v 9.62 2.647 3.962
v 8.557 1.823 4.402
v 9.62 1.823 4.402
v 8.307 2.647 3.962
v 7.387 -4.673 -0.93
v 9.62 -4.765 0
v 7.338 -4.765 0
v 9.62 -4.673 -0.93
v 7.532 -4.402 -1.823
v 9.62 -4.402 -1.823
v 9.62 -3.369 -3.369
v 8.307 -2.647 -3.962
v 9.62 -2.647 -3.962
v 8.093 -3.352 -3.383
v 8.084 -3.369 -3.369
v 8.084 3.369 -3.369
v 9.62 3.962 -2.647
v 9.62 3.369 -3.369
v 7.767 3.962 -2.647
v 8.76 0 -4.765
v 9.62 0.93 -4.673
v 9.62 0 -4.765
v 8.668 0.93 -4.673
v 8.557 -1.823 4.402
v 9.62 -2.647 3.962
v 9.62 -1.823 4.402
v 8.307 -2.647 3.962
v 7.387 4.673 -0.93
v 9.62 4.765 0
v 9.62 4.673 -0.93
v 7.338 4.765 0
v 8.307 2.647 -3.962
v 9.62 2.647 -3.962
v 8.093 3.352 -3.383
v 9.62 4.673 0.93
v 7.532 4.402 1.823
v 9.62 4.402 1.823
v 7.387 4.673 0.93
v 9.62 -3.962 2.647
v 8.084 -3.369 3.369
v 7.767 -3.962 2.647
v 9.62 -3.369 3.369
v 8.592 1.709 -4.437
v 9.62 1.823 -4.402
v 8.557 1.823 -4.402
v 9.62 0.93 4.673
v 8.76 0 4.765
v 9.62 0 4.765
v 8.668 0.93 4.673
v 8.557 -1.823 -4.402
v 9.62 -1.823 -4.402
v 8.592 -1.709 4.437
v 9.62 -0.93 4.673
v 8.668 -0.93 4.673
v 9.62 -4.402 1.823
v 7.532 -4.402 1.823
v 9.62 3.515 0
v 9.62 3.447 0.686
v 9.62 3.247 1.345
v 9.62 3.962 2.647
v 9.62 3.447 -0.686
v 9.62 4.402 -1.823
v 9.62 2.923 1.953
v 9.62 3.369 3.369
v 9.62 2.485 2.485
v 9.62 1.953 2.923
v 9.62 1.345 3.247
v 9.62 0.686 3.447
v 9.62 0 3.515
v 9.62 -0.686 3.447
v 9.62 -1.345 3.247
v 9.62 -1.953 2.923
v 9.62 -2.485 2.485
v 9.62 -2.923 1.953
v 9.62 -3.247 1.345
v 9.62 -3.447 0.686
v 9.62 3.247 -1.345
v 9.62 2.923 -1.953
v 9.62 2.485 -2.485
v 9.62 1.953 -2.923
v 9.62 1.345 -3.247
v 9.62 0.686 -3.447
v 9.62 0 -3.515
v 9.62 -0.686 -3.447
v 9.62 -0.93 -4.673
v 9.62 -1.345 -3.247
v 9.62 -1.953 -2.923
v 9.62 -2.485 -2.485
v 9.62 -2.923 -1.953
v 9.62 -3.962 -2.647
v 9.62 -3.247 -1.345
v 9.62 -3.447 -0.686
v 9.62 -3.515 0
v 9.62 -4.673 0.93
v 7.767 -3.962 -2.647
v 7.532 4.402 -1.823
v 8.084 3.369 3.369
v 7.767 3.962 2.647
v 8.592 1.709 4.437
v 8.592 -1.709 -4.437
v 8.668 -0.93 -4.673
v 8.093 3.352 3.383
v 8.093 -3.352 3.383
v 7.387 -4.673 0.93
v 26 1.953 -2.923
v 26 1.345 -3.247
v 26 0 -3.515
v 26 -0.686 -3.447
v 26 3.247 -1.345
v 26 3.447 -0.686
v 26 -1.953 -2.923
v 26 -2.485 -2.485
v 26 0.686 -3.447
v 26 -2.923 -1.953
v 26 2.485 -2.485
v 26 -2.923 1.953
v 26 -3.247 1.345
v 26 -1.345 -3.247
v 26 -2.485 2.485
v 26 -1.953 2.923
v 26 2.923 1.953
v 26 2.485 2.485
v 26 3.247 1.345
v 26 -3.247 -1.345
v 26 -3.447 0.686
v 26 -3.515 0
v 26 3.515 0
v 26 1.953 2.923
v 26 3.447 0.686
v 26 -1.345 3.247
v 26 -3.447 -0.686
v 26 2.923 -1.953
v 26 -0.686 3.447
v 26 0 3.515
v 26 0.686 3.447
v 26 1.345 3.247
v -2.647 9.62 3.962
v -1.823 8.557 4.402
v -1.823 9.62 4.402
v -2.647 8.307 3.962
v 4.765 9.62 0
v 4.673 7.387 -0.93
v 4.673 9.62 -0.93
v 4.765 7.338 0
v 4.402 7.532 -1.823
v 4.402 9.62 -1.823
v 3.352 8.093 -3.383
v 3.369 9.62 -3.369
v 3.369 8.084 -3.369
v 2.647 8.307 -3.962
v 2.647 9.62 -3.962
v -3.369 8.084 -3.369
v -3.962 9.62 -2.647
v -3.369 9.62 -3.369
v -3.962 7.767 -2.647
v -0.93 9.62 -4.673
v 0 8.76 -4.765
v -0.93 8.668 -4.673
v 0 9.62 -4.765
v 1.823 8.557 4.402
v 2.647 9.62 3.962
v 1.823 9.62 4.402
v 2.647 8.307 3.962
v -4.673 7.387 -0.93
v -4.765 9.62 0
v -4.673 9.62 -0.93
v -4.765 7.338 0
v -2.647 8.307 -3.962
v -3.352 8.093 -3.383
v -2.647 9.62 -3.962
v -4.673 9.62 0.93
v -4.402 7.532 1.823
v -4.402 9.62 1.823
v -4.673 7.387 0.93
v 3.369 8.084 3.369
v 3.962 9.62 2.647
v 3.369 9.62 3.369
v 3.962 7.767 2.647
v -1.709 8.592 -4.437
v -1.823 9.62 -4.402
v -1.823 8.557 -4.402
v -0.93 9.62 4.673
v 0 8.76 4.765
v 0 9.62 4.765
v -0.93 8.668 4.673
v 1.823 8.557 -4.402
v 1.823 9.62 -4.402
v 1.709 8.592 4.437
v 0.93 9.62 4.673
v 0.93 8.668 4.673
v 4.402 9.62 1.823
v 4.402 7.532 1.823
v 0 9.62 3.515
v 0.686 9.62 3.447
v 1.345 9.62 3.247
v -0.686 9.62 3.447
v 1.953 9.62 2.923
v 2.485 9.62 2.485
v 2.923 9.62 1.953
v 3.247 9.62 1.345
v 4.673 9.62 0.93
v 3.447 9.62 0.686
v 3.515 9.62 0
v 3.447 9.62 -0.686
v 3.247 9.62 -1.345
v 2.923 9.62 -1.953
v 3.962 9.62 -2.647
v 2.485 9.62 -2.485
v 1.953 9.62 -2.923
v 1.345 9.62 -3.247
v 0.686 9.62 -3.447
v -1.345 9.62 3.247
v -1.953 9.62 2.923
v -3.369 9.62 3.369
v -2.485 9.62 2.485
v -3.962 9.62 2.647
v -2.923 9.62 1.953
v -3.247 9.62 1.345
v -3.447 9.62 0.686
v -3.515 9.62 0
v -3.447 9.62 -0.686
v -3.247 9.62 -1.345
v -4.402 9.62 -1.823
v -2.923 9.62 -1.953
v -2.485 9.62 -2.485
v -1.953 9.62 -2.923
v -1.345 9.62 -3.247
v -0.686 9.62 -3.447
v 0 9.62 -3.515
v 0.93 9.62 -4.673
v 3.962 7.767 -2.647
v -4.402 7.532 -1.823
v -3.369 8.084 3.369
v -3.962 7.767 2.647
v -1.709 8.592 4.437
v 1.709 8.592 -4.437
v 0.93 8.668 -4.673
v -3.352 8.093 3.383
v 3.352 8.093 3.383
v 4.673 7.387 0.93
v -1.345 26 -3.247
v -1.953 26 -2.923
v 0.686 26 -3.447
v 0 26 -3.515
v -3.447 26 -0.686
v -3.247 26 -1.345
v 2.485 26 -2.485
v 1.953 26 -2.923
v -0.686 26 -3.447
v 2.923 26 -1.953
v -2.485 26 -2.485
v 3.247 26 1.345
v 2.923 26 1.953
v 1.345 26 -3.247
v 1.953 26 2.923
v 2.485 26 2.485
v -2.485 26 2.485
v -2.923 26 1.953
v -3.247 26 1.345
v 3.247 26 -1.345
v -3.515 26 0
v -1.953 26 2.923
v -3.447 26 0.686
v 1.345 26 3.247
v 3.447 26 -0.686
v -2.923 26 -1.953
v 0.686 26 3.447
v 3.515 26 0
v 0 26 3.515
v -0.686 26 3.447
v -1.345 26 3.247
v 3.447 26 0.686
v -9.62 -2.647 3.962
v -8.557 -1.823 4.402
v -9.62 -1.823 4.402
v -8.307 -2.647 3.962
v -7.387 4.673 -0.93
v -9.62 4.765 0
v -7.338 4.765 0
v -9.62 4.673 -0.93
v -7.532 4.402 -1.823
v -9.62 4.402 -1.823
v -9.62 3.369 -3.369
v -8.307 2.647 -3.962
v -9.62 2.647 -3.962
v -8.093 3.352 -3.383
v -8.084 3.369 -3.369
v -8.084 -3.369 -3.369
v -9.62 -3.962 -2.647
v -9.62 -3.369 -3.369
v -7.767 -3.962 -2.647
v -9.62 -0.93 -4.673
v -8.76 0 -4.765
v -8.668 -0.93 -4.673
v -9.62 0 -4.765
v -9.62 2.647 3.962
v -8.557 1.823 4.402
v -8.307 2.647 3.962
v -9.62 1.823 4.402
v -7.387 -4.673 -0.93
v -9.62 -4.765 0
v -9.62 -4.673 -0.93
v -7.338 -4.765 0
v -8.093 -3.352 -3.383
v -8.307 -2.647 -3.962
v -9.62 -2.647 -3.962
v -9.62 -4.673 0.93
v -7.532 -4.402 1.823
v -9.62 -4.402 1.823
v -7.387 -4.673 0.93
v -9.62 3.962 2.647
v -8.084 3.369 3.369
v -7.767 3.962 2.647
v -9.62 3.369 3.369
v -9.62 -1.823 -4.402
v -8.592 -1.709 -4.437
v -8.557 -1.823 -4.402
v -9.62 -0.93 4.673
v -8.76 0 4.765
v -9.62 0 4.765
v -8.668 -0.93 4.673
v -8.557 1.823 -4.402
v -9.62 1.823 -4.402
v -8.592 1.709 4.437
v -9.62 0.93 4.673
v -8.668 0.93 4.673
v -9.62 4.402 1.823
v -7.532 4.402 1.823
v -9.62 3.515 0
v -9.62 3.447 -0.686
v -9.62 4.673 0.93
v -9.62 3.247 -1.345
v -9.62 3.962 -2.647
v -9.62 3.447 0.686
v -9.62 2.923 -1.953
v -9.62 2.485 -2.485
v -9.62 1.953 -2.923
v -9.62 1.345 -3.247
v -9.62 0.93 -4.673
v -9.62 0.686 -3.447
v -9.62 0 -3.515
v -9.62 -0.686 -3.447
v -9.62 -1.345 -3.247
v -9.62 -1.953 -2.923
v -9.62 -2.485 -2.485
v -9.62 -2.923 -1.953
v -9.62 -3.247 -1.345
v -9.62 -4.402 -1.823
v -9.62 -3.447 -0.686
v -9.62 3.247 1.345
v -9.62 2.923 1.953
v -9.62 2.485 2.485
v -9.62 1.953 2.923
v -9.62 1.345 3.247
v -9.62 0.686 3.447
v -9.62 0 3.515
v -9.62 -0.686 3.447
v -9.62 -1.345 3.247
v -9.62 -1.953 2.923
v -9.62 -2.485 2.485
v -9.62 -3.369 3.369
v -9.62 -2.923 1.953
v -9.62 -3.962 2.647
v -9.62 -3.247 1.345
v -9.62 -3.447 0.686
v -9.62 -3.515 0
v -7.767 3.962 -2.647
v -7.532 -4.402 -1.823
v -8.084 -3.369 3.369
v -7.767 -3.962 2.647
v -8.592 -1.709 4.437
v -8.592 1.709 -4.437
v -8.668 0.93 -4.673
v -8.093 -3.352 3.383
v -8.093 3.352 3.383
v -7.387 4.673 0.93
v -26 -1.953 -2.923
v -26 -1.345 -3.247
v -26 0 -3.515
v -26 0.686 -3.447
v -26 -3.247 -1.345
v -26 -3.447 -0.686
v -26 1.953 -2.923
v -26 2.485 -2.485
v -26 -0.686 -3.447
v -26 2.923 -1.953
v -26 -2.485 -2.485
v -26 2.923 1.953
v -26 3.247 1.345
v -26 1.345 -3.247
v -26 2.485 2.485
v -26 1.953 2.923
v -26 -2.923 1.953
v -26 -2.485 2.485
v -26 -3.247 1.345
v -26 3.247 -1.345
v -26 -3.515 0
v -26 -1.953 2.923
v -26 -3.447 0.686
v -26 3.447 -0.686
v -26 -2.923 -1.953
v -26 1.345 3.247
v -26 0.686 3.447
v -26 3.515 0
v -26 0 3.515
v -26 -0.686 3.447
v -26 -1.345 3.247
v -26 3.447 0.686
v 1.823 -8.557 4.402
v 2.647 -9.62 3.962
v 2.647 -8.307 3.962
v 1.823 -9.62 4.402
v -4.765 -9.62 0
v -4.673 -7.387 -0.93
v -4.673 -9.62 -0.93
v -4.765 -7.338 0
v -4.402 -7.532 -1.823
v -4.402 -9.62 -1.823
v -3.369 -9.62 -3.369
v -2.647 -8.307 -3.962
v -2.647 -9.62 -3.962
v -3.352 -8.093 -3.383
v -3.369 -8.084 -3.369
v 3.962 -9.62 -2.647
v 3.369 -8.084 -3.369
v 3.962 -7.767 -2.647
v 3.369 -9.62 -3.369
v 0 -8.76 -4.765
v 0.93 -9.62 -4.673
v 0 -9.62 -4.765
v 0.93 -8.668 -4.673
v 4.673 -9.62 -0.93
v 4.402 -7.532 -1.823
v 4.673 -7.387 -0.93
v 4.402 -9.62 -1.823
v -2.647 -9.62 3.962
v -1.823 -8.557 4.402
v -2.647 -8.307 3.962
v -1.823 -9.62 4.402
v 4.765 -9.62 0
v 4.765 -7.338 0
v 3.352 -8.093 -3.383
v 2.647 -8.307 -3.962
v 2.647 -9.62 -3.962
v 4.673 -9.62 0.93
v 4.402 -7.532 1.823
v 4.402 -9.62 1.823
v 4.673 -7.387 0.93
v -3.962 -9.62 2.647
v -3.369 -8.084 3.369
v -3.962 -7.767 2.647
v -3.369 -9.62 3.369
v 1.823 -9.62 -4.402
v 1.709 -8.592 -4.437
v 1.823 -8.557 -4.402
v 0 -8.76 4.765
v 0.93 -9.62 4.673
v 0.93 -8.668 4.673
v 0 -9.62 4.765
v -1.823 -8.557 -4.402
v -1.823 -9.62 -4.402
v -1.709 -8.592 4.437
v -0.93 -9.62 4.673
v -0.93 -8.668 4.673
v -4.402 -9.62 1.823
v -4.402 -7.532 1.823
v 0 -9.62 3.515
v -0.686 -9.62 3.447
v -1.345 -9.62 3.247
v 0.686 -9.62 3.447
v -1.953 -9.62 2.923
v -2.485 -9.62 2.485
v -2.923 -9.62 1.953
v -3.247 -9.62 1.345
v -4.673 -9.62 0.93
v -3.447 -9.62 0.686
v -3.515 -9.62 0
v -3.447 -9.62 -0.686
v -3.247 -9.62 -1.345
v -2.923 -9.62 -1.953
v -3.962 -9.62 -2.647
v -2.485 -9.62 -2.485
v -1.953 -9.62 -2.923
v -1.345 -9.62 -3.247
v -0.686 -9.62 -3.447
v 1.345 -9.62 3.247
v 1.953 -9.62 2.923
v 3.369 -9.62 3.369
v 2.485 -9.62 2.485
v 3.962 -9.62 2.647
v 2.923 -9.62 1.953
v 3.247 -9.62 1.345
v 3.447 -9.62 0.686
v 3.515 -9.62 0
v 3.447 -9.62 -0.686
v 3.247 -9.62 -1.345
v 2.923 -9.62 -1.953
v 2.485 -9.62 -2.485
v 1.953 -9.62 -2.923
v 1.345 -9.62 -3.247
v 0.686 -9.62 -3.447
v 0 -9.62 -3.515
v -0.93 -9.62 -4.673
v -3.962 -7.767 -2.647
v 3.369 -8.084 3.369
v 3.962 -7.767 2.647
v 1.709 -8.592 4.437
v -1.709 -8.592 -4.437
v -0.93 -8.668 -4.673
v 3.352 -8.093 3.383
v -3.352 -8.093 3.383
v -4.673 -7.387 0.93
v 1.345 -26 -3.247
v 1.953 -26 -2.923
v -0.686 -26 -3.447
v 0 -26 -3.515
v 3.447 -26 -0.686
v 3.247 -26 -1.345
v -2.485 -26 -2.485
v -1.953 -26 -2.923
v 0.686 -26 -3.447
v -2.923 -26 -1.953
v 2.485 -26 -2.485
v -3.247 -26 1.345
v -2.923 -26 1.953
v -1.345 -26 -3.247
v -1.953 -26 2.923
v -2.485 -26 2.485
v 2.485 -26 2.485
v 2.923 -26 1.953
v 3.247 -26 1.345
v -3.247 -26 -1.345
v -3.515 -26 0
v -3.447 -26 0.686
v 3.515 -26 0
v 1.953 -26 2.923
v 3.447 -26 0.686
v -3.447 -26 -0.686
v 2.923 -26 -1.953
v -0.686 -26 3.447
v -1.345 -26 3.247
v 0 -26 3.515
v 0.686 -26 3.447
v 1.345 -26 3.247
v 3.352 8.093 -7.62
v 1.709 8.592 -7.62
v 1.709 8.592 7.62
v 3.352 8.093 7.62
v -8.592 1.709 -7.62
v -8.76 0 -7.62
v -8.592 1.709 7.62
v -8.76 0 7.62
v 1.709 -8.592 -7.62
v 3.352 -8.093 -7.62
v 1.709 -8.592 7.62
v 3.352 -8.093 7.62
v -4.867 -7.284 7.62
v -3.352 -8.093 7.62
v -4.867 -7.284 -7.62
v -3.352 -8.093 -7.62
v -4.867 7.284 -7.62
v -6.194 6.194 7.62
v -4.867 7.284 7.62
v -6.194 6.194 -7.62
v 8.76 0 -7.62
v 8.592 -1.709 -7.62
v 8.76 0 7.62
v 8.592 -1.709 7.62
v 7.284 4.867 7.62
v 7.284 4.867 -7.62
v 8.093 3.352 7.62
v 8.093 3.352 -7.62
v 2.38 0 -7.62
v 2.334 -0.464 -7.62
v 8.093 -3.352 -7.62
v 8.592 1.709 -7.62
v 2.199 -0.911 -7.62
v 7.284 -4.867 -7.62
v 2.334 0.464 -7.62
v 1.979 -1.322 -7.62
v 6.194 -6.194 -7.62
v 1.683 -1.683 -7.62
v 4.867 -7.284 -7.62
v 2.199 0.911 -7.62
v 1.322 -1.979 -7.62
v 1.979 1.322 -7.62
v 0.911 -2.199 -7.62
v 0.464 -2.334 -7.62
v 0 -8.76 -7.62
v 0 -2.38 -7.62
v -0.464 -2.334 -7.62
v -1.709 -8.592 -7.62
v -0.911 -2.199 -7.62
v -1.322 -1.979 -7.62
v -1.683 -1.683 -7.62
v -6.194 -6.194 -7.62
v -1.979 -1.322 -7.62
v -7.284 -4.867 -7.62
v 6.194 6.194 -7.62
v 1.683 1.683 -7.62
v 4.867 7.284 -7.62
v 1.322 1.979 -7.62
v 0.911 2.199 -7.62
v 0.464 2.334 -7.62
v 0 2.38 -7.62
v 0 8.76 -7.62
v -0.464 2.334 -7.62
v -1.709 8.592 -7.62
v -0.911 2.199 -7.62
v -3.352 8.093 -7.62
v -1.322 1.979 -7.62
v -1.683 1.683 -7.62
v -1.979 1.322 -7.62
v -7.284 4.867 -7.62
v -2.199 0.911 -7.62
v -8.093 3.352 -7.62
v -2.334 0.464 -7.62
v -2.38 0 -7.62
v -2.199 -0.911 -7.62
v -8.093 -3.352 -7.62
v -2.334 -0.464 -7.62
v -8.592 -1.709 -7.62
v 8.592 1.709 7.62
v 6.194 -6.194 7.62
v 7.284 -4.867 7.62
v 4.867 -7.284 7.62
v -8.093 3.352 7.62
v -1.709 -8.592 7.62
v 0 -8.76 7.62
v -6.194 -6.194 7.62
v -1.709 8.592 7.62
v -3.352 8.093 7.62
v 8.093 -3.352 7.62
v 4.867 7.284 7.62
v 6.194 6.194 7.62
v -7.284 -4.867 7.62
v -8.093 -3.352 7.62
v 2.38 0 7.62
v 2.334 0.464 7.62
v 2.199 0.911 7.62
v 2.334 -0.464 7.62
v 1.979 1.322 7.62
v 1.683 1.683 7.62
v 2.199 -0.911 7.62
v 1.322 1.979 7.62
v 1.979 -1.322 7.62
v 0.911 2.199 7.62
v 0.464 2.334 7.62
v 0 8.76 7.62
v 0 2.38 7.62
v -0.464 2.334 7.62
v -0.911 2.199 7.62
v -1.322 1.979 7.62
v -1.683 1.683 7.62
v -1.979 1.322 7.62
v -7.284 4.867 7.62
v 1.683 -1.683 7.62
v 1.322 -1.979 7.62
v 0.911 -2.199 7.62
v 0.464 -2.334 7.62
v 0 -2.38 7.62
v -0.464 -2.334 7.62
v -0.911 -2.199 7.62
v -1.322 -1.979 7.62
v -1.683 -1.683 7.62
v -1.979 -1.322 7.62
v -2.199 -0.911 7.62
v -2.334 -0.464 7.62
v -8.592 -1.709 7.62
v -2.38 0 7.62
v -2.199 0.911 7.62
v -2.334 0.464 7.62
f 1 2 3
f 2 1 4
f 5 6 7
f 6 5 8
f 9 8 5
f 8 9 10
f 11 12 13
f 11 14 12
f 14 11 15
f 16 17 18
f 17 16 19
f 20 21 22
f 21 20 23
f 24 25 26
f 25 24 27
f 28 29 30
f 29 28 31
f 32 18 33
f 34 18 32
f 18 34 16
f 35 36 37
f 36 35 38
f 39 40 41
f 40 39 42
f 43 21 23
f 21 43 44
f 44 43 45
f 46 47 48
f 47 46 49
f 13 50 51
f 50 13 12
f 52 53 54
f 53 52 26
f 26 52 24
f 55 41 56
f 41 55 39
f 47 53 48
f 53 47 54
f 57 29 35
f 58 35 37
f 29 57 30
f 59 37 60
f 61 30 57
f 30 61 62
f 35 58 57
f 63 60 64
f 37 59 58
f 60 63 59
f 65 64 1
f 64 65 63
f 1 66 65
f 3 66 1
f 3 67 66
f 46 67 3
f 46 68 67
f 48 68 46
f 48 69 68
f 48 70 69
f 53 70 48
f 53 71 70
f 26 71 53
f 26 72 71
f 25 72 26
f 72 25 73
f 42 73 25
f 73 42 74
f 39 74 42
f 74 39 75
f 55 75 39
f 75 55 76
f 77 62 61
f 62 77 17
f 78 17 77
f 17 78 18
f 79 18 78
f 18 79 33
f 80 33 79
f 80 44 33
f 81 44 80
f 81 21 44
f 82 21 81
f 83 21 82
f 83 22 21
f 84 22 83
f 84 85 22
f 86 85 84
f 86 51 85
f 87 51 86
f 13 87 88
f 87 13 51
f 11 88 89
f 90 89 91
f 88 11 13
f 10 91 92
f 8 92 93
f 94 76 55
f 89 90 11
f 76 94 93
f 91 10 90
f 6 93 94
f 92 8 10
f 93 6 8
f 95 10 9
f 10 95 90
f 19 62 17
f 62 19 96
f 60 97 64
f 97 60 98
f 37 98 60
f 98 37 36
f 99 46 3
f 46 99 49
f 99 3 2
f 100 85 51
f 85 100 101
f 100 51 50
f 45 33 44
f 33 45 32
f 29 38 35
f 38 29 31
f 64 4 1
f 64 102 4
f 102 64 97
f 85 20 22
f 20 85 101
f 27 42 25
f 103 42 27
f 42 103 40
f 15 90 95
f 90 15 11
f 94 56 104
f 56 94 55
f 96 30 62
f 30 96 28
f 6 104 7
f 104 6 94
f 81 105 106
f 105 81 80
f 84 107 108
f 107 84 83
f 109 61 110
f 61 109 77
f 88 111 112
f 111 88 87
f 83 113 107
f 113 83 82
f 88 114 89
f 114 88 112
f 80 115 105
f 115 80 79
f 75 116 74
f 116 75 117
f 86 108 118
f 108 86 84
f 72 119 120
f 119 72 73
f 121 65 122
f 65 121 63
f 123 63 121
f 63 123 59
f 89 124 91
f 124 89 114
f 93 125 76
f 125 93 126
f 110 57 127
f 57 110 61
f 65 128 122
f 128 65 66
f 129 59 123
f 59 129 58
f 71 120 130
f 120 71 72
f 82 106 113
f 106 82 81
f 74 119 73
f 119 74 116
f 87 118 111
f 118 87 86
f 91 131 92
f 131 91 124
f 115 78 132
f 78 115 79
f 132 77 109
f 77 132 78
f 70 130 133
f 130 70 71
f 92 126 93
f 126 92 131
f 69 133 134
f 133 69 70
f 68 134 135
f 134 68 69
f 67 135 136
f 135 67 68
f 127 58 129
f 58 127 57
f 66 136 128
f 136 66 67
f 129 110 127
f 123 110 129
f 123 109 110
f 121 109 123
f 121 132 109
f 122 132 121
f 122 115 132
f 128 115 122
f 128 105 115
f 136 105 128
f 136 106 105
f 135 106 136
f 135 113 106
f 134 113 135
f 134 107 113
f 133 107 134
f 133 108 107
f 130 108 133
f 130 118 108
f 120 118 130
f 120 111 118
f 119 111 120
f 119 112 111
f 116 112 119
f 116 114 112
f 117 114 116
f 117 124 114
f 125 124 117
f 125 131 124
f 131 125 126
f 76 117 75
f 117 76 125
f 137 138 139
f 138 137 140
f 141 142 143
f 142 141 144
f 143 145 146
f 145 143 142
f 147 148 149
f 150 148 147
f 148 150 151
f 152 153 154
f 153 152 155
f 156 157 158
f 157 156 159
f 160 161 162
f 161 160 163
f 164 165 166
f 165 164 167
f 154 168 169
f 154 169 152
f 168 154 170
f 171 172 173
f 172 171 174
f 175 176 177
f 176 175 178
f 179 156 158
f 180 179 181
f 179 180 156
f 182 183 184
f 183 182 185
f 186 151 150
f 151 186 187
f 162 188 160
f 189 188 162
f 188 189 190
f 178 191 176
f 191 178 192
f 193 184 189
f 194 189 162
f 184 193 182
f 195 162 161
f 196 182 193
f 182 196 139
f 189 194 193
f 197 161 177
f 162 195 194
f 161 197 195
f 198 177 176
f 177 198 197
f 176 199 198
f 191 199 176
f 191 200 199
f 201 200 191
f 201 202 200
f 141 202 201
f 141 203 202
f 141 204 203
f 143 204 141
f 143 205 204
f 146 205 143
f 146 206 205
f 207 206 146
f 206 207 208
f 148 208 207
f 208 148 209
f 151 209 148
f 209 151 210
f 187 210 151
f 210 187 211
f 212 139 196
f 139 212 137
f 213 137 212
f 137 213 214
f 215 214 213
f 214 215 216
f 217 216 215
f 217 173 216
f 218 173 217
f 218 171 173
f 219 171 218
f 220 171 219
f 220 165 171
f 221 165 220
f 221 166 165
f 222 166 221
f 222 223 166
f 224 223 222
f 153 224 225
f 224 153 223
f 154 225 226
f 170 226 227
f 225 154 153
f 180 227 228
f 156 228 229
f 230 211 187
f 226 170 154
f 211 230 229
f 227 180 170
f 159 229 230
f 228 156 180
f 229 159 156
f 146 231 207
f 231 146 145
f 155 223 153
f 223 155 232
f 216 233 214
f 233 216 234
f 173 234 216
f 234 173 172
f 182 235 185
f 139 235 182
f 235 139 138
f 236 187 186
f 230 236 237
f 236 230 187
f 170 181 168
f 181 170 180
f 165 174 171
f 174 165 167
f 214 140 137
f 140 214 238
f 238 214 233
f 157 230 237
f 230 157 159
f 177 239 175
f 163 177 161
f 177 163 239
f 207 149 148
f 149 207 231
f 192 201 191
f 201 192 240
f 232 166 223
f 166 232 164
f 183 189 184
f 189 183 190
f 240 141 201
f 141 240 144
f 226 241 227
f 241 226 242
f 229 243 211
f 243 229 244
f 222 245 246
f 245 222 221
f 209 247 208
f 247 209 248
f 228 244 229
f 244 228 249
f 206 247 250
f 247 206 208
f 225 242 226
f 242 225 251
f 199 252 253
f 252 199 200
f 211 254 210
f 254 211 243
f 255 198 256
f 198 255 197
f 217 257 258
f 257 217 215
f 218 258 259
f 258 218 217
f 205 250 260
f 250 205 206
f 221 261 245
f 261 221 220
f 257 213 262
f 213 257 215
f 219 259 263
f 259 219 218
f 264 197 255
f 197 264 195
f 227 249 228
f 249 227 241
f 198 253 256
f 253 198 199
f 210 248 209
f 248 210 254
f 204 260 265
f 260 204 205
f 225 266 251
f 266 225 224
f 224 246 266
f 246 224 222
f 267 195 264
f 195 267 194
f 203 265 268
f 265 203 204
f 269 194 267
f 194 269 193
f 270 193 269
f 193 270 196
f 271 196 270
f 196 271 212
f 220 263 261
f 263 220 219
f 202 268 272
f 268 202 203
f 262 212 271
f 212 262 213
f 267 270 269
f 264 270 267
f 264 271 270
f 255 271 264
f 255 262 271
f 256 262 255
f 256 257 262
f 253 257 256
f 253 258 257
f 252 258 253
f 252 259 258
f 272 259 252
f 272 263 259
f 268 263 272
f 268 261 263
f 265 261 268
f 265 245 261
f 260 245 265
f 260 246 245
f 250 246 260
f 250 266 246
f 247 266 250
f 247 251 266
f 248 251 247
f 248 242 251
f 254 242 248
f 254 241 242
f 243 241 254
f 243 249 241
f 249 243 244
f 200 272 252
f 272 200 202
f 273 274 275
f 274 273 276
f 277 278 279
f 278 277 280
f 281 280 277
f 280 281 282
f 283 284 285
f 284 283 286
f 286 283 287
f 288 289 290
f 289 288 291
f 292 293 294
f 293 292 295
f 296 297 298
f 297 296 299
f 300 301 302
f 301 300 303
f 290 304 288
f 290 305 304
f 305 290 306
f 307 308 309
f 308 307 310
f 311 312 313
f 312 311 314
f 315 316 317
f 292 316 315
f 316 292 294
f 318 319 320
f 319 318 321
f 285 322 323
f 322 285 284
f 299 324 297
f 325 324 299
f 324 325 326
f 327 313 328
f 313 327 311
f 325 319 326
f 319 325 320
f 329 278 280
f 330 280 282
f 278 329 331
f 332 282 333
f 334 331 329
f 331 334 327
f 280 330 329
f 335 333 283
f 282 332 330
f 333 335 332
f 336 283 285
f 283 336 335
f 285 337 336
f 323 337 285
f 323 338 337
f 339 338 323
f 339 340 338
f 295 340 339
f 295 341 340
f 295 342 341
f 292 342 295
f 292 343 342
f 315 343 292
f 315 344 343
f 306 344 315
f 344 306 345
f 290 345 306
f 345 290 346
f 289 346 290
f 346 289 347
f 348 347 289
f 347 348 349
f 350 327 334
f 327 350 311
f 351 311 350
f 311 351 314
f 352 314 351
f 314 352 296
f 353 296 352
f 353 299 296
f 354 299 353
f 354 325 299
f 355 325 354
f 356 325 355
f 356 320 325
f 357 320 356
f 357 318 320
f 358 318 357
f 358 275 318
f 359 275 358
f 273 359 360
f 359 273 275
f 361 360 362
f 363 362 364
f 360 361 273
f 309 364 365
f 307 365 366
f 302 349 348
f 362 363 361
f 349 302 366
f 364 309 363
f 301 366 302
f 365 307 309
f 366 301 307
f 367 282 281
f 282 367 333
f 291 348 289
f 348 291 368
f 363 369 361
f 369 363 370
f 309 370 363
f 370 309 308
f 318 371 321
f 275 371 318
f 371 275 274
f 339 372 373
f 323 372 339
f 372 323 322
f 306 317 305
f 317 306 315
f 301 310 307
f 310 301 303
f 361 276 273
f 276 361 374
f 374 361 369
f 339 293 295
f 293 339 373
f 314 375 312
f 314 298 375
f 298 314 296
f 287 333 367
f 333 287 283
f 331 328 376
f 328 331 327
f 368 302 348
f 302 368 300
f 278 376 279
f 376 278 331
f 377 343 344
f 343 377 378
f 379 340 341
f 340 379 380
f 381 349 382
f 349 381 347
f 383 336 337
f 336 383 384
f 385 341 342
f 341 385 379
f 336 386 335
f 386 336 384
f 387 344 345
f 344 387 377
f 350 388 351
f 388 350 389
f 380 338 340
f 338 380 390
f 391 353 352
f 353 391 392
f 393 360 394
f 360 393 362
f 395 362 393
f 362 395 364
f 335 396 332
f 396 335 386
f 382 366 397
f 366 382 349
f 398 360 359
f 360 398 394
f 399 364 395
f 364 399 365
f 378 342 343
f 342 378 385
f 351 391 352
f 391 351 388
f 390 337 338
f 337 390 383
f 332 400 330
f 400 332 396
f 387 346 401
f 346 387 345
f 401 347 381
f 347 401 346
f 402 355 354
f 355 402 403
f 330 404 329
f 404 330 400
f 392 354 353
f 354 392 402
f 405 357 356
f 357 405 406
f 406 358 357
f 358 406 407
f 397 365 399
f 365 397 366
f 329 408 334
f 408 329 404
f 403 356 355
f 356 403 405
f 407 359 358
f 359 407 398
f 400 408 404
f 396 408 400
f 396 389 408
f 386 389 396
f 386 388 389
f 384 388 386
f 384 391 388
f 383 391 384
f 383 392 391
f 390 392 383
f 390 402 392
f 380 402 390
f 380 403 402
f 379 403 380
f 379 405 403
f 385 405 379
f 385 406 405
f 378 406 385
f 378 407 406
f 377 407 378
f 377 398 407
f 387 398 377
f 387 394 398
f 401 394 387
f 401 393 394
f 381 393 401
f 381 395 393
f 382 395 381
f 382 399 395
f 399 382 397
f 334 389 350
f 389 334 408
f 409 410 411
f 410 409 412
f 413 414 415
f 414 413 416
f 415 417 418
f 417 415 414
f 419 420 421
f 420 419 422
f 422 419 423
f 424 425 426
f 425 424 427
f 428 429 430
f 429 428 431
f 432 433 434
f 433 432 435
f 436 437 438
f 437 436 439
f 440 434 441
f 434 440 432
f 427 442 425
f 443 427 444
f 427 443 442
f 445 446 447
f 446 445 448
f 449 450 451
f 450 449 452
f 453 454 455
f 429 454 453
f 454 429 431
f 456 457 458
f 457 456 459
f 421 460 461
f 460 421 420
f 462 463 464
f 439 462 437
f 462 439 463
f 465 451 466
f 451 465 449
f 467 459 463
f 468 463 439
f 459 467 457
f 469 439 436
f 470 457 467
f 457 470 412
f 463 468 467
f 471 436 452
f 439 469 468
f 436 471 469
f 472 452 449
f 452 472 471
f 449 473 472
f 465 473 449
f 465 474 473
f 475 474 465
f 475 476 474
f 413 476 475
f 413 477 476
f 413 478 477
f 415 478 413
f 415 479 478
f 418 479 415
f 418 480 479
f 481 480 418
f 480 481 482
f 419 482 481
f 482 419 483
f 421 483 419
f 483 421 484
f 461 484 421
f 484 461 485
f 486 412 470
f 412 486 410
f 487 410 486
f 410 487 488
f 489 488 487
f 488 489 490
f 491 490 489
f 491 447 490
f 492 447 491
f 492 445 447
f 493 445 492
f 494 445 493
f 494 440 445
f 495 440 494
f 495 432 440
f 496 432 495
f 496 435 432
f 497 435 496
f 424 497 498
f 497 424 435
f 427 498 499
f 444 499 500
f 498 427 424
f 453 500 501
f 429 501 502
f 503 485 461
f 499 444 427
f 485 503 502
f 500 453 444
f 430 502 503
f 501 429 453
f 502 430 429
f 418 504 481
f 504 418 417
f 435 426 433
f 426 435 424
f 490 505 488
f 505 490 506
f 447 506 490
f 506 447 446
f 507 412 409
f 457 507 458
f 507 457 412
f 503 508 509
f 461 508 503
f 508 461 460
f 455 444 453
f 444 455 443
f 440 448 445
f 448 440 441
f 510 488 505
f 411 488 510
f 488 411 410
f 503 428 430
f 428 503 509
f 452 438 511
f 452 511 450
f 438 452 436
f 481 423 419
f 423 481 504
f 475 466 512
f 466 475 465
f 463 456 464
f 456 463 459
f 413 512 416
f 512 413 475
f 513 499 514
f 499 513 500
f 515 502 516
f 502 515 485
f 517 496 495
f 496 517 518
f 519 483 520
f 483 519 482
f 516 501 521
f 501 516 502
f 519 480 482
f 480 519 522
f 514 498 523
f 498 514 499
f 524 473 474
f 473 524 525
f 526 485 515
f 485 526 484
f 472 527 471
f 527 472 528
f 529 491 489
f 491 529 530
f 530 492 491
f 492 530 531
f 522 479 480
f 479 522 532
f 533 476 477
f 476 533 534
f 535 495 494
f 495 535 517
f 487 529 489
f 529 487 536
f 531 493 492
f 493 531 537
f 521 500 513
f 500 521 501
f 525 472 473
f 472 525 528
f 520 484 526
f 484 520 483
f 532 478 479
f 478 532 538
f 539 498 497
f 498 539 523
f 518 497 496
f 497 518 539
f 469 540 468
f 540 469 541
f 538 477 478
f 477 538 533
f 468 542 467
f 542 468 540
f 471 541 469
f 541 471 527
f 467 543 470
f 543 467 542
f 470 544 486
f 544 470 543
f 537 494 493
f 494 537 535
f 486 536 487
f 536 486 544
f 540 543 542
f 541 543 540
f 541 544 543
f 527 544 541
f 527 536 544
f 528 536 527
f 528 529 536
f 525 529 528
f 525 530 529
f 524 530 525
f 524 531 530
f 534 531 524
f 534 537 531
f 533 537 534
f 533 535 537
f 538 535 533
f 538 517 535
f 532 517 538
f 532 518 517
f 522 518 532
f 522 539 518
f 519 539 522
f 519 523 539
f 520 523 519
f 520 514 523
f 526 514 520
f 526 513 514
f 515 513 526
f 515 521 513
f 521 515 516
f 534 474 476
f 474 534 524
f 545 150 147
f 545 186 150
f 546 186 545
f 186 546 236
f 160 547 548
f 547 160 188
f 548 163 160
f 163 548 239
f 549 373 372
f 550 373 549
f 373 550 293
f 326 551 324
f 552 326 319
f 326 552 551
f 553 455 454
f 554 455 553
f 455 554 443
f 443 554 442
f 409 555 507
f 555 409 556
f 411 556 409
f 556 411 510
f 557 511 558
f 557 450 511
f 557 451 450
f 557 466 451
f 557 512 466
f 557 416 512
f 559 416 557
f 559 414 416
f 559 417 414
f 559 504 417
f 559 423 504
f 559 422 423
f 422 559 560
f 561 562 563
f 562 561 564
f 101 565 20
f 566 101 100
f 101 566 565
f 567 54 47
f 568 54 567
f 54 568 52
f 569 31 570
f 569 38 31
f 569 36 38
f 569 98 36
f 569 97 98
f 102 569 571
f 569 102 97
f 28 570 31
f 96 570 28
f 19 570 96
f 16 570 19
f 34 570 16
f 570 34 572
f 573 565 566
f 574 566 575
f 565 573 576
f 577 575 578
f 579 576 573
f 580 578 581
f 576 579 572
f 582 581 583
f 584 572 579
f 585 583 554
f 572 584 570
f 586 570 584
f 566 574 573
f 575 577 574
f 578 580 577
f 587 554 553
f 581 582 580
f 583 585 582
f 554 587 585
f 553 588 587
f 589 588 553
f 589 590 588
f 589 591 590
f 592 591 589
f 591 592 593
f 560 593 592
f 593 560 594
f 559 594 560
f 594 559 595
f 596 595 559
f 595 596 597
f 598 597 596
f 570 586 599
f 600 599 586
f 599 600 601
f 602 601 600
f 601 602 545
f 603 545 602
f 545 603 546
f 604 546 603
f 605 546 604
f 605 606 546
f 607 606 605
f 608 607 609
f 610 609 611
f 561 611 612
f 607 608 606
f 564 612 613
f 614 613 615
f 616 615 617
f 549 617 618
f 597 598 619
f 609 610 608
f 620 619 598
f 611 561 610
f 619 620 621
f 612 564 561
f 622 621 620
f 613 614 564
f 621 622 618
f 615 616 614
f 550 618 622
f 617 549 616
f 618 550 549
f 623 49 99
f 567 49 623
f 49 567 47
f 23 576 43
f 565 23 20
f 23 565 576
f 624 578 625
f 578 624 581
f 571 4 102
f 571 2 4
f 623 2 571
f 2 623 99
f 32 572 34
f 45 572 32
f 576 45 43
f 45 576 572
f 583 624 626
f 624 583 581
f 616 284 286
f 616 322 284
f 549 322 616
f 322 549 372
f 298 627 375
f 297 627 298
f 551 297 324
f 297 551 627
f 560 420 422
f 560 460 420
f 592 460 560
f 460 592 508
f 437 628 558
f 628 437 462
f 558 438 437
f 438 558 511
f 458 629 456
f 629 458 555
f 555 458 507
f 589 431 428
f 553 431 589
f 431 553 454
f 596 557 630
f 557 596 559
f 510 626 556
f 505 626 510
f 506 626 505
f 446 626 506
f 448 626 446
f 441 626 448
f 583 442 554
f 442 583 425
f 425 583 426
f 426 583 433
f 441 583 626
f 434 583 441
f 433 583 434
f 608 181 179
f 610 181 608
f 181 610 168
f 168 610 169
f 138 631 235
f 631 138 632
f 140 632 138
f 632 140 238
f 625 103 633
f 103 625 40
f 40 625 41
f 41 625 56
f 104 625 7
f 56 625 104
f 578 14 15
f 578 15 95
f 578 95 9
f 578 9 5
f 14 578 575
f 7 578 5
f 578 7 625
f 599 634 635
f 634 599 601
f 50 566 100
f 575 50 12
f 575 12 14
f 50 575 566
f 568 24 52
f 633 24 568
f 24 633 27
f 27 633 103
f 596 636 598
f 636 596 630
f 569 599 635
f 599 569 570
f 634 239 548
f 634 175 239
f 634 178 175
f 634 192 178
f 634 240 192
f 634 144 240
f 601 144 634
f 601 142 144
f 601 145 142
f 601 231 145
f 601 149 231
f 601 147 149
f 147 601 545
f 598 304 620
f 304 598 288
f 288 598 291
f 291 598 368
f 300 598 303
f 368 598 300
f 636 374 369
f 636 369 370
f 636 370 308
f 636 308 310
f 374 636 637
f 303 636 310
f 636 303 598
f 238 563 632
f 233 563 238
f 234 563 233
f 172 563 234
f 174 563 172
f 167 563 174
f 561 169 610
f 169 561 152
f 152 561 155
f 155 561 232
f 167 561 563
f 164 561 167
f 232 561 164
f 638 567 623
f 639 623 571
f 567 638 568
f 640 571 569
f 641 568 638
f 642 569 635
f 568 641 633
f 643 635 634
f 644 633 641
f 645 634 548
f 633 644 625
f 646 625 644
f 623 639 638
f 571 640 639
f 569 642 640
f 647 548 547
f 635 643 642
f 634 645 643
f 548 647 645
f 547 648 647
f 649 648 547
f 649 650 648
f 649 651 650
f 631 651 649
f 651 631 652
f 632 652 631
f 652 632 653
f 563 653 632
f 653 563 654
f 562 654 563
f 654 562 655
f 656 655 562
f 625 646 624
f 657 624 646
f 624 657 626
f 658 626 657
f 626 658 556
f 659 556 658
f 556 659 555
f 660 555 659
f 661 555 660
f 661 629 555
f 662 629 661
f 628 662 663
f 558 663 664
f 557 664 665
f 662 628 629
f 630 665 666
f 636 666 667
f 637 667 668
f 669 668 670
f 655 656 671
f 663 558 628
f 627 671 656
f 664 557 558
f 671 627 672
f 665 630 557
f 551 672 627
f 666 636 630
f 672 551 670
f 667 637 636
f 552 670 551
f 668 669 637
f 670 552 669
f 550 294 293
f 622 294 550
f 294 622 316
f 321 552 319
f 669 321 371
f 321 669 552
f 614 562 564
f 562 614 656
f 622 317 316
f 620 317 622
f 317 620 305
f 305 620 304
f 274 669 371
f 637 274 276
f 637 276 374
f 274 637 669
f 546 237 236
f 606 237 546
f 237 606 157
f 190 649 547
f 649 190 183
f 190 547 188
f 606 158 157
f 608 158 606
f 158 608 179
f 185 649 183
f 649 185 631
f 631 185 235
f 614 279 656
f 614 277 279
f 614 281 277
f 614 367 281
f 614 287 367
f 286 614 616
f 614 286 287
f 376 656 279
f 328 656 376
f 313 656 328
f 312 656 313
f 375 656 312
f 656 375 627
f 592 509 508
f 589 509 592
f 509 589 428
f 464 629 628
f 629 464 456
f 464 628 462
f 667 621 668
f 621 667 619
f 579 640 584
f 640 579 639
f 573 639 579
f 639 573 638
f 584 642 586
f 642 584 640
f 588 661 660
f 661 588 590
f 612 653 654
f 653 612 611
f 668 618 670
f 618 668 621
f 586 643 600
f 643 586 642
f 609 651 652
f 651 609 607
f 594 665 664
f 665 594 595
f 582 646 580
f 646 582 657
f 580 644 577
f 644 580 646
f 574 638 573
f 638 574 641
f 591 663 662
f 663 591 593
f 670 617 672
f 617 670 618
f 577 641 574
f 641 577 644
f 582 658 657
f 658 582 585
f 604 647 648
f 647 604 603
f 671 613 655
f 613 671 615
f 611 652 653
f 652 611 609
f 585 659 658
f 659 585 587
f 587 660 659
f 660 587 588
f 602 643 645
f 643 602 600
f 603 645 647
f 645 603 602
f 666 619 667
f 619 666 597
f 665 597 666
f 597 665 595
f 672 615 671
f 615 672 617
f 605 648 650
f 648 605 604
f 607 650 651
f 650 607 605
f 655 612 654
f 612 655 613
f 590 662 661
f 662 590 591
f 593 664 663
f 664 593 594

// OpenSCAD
$fn = 32;

// ----------------------------------------------------------------------
// Cardan cross: 52 mm span, 9.53 mm trunnions
// ----------------------------------------------------------------------

// --- parameters (mm) ---
journal_d = 9.53;         // trunnion diameter
arm_len = 26;             // trunnion length from the centre
step_r = 3.24;            // step position from the centre
step_d = 7.03;            // journal diameter after the step
hub_d = 17.52;            // hub diameter
hub_h = 15.24;            // hub height
bore_d = 4.76;            // hub bore

difference() {
  union() {
    /* hub along the joint axis */
    cylinder(h = hub_h, d = hub_d, center = true);
    for (a = [0 : 90 : 270]) rotate([0, 0, a]) {
      /* trunnion, sunk into the hub */
      translate([hub_d / 4, 0, 0]) rotate([0, 90, 0]) cylinder(h = step_r + 2, d = journal_d);
      /* stepped journal out to the tip */
      translate([step_r - 0.5, 0, 0]) rotate([0, 90, 0]) cylinder(h = arm_len + 0.5 - step_r, d = step_d);
    }
  }
  /* lubrication bore through the hub, 2.5 mm clear on both sides */
  translate([0, 0, -hub_h / 2 - 2.5]) cylinder(h = hub_h + 5, d = bore_d);
}
